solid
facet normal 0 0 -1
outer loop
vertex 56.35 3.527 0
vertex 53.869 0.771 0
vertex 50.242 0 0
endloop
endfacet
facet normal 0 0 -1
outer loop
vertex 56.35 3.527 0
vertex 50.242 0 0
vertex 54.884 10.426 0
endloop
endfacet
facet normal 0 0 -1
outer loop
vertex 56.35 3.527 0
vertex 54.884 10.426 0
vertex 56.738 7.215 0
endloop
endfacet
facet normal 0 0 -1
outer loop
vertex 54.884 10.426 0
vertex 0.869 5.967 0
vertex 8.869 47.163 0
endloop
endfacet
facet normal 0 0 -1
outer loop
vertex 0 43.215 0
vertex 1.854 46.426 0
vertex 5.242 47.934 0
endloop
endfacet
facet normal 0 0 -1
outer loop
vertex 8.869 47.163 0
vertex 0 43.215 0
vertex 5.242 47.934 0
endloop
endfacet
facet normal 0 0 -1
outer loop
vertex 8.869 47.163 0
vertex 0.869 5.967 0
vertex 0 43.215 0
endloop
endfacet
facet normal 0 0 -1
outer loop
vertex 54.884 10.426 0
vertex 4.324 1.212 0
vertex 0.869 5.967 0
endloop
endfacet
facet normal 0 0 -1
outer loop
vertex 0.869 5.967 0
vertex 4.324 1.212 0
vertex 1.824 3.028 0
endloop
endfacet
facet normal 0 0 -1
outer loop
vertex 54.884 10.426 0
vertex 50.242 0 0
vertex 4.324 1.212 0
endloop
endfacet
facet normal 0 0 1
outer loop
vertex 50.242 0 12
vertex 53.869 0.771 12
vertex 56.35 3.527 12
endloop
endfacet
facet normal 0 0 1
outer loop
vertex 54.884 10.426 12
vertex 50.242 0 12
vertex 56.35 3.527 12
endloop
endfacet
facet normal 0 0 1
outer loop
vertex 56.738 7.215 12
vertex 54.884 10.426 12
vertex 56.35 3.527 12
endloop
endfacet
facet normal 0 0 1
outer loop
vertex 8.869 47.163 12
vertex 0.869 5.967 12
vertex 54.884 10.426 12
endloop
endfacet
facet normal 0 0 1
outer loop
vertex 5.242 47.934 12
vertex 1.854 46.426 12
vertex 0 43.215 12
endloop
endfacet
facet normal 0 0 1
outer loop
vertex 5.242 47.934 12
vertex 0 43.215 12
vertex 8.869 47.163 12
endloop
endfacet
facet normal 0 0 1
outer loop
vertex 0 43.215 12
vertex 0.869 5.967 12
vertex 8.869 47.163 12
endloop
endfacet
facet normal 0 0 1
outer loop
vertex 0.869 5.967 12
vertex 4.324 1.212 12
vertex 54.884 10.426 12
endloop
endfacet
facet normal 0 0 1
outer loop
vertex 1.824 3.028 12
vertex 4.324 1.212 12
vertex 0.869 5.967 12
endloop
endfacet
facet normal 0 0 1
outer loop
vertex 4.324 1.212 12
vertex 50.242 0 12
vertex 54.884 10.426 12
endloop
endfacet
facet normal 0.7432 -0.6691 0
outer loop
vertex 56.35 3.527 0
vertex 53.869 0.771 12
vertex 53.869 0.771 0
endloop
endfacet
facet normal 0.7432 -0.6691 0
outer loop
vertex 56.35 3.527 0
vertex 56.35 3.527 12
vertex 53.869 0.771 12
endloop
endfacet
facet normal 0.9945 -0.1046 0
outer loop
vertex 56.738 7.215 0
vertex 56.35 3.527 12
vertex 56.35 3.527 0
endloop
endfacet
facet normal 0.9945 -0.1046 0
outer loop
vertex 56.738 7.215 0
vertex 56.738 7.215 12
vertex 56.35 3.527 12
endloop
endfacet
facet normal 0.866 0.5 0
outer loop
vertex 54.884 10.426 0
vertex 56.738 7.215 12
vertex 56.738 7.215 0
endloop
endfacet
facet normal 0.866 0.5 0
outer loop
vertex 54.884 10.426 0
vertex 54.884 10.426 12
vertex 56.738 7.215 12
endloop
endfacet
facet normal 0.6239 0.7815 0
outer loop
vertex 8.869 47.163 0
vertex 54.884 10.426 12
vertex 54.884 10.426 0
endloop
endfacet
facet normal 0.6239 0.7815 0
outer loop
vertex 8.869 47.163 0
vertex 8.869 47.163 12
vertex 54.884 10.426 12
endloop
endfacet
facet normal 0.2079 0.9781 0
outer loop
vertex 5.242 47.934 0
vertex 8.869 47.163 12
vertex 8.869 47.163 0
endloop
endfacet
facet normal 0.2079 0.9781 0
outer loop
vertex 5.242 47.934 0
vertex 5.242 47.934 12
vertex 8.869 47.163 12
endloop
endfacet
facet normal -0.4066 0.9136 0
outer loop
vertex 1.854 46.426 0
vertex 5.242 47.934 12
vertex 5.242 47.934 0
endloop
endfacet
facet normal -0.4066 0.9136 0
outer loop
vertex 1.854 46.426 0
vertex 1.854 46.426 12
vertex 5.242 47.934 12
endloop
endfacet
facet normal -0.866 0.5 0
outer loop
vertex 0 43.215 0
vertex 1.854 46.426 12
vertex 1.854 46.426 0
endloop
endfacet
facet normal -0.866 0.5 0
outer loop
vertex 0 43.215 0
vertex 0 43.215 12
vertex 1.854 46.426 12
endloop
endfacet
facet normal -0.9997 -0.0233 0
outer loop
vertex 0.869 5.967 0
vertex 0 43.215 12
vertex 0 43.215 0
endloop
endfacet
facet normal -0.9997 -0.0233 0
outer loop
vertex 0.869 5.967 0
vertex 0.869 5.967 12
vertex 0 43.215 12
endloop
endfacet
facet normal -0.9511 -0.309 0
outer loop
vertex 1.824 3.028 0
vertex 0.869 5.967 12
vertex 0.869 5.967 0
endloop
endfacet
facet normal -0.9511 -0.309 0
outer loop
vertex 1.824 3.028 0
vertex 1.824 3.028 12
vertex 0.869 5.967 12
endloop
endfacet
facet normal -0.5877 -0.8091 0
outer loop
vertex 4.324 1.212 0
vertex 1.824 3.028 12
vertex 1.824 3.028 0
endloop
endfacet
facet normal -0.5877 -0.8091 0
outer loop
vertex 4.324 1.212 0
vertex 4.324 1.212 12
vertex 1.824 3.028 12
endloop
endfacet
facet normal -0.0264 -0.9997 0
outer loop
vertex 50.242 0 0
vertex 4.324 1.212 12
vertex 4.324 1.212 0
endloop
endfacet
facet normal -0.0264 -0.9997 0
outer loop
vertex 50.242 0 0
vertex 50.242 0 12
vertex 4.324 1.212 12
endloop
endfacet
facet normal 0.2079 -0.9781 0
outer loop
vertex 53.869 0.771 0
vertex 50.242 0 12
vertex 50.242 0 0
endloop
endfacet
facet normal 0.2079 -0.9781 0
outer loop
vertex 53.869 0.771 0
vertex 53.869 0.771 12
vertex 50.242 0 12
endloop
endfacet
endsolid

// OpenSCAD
$fn = 32;

// ----------------------------------------------------------------------
// Lever arm: two bosses 10 and 12 mm, 45 mm between centres
// ----------------------------------------------------------------------

// --- parameters (mm) ---
profile_height = 12;      // extrusion height
profile_points = 12;      // points of the closed outline

profile = [[0, 43.215], [0.869, 5.967], [1.824, 3.028], [4.324, 1.212], [50.242, 0], [53.869, 0.771], [56.35, 3.527], [56.738, 7.215], [54.884, 10.426], [8.869, 47.163], [5.242, 47.934], [1.854, 46.426]];  // single closed polygon, 12 points, counter clockwise

// --- the one profile operation ---
linear_extrude(height = profile_height) polygon(points = profile);
